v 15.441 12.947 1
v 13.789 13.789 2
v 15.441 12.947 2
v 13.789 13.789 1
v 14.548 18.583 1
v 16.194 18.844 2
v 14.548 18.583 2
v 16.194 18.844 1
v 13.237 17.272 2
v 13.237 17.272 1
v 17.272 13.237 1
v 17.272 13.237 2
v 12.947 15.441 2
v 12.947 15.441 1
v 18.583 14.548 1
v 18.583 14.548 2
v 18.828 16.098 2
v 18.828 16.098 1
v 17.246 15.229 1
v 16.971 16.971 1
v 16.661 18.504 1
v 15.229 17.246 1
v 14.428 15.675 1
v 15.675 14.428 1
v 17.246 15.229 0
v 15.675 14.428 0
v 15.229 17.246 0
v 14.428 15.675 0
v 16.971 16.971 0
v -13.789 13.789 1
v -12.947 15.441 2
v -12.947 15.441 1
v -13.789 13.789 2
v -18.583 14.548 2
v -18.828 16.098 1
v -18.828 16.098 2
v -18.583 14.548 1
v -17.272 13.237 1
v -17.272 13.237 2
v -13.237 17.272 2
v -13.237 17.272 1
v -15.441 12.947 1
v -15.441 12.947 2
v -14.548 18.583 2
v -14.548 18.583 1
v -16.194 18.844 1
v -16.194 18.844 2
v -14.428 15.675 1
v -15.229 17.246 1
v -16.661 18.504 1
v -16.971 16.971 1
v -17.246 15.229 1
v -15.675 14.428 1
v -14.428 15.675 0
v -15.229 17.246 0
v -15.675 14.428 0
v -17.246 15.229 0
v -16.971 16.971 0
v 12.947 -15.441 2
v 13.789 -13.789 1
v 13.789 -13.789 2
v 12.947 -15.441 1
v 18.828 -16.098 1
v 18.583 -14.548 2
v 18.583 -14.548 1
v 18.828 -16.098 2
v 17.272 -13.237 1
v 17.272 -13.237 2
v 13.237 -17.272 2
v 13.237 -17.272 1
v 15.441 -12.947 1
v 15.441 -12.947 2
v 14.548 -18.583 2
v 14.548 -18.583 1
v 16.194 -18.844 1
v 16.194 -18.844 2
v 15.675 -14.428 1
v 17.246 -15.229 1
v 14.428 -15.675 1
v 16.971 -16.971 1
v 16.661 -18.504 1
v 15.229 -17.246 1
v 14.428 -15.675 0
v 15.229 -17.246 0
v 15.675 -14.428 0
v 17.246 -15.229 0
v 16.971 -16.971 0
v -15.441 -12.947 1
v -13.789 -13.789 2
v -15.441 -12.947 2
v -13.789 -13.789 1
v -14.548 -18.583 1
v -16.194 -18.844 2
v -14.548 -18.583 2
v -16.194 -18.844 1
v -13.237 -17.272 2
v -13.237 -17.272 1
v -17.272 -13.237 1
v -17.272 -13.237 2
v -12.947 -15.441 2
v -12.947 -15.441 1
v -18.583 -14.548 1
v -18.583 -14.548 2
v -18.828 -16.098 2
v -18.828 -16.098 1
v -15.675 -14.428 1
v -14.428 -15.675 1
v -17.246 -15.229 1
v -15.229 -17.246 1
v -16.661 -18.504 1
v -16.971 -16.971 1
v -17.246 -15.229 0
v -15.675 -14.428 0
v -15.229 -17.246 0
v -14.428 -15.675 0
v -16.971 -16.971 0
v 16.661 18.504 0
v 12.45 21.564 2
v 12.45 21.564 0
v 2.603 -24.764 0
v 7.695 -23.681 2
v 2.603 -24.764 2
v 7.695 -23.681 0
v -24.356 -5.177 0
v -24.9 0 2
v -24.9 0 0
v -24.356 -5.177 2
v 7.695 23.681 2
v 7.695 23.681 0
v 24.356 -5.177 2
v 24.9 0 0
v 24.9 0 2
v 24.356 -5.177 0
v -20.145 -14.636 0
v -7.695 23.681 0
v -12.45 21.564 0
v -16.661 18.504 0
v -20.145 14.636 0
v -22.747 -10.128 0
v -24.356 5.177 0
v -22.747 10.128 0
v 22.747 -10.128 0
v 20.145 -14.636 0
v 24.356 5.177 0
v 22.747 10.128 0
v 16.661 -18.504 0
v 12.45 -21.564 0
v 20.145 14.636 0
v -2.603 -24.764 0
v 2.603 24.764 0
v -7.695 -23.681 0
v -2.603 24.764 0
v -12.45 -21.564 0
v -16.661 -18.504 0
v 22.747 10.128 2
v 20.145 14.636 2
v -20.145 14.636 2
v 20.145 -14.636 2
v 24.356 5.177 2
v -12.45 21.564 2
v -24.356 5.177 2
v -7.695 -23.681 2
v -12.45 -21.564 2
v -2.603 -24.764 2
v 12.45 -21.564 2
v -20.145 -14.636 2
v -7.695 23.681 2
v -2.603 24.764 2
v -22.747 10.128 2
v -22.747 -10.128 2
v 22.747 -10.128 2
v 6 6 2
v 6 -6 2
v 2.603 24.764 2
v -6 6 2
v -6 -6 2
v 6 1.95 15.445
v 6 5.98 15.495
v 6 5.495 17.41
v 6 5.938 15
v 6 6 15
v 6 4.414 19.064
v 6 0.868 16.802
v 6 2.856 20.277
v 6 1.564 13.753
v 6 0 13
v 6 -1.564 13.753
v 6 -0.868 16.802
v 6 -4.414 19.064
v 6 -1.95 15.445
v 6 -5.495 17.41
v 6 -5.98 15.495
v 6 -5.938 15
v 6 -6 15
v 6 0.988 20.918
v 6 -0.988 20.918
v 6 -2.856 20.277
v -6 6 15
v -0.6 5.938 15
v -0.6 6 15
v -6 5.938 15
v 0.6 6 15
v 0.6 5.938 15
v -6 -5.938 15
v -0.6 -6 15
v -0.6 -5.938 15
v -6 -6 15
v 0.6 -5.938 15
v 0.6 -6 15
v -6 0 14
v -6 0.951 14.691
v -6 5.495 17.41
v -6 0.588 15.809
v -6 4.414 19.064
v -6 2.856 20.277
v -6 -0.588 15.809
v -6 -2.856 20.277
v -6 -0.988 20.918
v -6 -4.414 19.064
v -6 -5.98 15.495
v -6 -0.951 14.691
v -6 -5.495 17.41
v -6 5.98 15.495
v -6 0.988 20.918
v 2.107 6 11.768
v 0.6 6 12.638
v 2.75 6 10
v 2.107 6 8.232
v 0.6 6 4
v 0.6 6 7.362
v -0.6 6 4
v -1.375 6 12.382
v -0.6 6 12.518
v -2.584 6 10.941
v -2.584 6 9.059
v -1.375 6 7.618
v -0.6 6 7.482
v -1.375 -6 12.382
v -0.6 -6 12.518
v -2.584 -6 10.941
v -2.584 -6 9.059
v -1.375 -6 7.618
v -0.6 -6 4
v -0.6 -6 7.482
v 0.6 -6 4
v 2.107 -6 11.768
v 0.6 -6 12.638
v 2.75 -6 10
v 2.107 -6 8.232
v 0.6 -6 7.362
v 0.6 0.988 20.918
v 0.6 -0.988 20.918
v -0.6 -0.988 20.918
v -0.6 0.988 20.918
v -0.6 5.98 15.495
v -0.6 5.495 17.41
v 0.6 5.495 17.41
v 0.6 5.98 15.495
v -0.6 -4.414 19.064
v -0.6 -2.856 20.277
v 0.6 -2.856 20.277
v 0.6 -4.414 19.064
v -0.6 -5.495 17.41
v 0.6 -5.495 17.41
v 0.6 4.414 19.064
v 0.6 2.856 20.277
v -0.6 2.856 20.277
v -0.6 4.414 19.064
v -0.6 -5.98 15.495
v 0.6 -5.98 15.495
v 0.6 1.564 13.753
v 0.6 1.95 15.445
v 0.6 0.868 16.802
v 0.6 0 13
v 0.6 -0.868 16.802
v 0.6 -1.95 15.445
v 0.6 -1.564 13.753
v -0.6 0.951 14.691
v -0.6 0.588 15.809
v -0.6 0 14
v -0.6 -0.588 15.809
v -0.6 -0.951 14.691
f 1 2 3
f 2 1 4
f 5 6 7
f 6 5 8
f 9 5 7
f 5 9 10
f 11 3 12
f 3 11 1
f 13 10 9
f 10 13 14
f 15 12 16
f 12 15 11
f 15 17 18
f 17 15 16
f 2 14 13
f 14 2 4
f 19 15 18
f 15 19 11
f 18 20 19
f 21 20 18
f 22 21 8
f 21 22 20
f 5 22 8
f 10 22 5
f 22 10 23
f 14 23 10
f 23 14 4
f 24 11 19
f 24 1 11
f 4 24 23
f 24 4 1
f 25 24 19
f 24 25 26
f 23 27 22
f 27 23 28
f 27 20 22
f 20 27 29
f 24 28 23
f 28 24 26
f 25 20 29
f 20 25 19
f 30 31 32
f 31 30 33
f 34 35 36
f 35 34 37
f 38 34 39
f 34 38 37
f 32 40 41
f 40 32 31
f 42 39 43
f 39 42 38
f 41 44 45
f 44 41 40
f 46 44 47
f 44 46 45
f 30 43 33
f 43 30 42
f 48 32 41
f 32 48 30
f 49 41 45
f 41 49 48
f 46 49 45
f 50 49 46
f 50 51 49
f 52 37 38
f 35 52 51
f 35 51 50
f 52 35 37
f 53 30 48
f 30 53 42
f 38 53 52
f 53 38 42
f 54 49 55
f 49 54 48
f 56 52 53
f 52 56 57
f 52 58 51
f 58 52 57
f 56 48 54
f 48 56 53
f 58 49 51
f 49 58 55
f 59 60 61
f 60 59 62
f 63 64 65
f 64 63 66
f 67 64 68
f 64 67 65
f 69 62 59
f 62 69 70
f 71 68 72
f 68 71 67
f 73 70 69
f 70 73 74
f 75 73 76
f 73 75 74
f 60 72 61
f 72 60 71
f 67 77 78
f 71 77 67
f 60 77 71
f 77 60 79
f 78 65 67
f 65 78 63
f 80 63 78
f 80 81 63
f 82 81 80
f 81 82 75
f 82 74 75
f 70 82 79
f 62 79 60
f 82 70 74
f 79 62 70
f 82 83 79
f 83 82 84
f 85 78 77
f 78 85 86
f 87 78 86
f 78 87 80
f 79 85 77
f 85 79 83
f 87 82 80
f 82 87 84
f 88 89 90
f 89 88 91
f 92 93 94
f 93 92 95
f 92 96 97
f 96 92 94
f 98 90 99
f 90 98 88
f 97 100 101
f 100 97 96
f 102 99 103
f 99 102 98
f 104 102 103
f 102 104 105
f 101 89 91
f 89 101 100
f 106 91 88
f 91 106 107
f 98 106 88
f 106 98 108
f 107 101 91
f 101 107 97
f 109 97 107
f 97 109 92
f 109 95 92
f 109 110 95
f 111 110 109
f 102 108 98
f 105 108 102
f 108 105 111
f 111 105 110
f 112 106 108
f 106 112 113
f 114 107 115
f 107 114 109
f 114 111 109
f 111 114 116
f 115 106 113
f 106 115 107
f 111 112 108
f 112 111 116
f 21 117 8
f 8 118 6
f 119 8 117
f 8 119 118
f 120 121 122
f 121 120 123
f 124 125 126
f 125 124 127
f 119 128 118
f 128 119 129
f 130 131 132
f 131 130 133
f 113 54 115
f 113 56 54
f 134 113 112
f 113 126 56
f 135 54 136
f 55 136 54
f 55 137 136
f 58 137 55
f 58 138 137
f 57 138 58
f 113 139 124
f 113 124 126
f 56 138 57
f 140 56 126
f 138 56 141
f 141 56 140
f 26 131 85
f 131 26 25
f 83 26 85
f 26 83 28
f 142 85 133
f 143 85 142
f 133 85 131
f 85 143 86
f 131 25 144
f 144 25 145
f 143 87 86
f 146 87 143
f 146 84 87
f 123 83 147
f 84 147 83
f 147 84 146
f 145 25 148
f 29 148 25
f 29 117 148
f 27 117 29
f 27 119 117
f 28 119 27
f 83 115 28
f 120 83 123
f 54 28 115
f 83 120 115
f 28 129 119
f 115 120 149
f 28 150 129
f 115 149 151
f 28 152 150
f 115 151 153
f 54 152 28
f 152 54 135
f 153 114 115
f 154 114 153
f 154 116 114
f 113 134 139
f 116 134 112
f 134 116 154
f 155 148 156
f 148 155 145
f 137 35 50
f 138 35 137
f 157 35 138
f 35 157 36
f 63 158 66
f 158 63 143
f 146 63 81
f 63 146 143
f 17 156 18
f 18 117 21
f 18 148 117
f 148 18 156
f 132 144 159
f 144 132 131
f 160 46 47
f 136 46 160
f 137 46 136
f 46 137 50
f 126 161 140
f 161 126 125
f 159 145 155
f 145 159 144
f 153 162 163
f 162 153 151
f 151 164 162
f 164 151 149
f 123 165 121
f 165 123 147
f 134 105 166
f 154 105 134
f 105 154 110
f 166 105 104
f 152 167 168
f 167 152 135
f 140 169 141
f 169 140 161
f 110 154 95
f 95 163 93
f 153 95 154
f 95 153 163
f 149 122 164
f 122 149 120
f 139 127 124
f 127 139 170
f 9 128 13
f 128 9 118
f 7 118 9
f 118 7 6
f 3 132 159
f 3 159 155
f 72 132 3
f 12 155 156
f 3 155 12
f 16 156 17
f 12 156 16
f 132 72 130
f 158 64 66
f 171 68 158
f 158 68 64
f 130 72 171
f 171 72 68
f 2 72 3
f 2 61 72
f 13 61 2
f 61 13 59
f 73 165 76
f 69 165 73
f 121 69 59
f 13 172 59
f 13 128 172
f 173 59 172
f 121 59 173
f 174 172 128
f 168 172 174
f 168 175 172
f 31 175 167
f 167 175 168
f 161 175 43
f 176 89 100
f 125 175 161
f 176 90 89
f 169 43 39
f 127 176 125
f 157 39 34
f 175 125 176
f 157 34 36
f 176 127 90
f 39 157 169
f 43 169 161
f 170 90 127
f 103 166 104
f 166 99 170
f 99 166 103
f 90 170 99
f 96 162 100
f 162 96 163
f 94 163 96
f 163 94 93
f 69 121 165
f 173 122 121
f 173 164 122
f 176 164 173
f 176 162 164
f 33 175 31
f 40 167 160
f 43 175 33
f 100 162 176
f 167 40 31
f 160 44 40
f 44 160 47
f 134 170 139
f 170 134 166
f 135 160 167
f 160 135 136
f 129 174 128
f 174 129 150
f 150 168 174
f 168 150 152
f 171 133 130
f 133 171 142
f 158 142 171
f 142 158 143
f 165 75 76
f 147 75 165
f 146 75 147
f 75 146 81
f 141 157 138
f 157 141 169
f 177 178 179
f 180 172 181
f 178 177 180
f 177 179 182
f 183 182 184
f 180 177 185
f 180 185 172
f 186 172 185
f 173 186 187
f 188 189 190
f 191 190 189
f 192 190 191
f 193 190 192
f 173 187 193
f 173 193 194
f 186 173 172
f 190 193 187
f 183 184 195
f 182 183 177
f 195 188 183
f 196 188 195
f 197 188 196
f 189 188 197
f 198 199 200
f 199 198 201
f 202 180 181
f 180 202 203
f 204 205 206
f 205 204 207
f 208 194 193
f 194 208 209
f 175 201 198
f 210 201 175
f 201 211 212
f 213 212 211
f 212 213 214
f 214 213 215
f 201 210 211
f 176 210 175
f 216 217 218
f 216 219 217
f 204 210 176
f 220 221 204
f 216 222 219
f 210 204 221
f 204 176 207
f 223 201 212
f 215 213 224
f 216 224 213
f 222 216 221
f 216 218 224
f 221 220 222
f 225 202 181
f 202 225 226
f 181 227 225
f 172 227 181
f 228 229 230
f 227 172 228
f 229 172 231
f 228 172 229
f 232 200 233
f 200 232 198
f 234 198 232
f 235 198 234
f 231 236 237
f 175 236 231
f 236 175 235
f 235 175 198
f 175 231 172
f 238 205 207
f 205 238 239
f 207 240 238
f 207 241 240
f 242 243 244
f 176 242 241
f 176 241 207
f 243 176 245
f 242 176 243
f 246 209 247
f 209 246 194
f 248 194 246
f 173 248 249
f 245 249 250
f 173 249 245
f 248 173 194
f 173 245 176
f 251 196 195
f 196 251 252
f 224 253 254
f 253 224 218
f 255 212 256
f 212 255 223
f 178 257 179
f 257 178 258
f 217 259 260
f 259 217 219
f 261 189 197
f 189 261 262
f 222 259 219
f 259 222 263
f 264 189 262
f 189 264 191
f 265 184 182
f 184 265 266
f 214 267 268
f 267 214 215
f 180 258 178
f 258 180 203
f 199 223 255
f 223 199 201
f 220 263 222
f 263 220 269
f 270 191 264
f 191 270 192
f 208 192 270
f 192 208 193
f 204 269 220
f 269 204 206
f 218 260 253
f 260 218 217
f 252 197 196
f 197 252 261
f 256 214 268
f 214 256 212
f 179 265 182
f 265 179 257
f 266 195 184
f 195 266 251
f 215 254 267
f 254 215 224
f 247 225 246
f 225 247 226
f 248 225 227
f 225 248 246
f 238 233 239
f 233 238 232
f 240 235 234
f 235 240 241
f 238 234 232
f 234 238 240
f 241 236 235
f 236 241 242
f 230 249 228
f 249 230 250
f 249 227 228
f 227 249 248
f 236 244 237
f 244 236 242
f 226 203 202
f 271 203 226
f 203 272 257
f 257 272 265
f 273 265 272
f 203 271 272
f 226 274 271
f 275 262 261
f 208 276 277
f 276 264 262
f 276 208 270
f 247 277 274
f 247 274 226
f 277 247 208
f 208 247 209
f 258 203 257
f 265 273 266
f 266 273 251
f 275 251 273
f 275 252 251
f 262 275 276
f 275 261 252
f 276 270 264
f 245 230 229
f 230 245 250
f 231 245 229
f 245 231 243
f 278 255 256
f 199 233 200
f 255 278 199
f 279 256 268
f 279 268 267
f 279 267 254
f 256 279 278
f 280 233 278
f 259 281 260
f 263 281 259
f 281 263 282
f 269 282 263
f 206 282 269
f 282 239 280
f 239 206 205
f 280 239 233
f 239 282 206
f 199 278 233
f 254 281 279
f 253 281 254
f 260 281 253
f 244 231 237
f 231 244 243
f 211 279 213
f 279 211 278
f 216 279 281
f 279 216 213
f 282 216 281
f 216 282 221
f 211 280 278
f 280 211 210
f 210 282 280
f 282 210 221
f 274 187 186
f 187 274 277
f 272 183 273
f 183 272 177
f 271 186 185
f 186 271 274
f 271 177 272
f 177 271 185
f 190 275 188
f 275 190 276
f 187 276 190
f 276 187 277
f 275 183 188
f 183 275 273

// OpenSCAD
/*
    I have a dial indicator measuing device, that I want to use to measure the flatness of surfaces of machines
    (for example, the flatness of my 3D printer bed). Alas, it didn't come with a means to attach it to anything.
    
    This adds an attachment, which is then easy to clamp to the machine, using standard clamps.
    
    Print Notes
        I printed with 
*/

baseD=49.8;
slot=1.2;
thickness=2;
rodD=5.5;
rodH=10;

screwD1=2;
screwD2=4;
screwH=15;

post=12;
height=21;

module attachment()
{
    difference() {
        cylinder( d=baseD, h=thickness );
        for (a=[45,45+90, -45, -45-90]) {
            rotate( [0,0,a] ) translate( [45/2,0,0] ) {
                // screw head indent
                translate([0,0,thickness/2]) cylinder( d=6, h=10 );
                // screw hole
                translate([0,0,-1]) cylinder( d=3, h=10 );
            }
        }
    }
    
    // Protrusion, which can be connected to a 6mm round rod.
    difference() {
        // Square peg
        union() {
            translate( [-post/2, -post/2,0] ) cube( [post, post, height-post/2] );
            translate( [-post/2,0,height-post/2] ) rotate([0,90,0]) cylinder( d=post, h=post );
        }
        
        // Hole for the rod
        #translate( [0,20,rodH] ) rotate( [90,0,0] ) cylinder( d=rodD, h=40 );
        // Slot, which is squeezed to hold the rod.
        translate( [-slot/2,-10,thickness+2] ) cube( [slot,20,140] );
        // Screw hole
        translate( [-post,0,screwH] ) rotate( [0,90,0] ) cylinder( d=screwD1, h=post*2 );
        // Bolt head indent
        translate( [0,0,screwH] ) rotate( [0,90,0] ) cylinder( d=screwD2, h=post );
    }
}

attachment();
